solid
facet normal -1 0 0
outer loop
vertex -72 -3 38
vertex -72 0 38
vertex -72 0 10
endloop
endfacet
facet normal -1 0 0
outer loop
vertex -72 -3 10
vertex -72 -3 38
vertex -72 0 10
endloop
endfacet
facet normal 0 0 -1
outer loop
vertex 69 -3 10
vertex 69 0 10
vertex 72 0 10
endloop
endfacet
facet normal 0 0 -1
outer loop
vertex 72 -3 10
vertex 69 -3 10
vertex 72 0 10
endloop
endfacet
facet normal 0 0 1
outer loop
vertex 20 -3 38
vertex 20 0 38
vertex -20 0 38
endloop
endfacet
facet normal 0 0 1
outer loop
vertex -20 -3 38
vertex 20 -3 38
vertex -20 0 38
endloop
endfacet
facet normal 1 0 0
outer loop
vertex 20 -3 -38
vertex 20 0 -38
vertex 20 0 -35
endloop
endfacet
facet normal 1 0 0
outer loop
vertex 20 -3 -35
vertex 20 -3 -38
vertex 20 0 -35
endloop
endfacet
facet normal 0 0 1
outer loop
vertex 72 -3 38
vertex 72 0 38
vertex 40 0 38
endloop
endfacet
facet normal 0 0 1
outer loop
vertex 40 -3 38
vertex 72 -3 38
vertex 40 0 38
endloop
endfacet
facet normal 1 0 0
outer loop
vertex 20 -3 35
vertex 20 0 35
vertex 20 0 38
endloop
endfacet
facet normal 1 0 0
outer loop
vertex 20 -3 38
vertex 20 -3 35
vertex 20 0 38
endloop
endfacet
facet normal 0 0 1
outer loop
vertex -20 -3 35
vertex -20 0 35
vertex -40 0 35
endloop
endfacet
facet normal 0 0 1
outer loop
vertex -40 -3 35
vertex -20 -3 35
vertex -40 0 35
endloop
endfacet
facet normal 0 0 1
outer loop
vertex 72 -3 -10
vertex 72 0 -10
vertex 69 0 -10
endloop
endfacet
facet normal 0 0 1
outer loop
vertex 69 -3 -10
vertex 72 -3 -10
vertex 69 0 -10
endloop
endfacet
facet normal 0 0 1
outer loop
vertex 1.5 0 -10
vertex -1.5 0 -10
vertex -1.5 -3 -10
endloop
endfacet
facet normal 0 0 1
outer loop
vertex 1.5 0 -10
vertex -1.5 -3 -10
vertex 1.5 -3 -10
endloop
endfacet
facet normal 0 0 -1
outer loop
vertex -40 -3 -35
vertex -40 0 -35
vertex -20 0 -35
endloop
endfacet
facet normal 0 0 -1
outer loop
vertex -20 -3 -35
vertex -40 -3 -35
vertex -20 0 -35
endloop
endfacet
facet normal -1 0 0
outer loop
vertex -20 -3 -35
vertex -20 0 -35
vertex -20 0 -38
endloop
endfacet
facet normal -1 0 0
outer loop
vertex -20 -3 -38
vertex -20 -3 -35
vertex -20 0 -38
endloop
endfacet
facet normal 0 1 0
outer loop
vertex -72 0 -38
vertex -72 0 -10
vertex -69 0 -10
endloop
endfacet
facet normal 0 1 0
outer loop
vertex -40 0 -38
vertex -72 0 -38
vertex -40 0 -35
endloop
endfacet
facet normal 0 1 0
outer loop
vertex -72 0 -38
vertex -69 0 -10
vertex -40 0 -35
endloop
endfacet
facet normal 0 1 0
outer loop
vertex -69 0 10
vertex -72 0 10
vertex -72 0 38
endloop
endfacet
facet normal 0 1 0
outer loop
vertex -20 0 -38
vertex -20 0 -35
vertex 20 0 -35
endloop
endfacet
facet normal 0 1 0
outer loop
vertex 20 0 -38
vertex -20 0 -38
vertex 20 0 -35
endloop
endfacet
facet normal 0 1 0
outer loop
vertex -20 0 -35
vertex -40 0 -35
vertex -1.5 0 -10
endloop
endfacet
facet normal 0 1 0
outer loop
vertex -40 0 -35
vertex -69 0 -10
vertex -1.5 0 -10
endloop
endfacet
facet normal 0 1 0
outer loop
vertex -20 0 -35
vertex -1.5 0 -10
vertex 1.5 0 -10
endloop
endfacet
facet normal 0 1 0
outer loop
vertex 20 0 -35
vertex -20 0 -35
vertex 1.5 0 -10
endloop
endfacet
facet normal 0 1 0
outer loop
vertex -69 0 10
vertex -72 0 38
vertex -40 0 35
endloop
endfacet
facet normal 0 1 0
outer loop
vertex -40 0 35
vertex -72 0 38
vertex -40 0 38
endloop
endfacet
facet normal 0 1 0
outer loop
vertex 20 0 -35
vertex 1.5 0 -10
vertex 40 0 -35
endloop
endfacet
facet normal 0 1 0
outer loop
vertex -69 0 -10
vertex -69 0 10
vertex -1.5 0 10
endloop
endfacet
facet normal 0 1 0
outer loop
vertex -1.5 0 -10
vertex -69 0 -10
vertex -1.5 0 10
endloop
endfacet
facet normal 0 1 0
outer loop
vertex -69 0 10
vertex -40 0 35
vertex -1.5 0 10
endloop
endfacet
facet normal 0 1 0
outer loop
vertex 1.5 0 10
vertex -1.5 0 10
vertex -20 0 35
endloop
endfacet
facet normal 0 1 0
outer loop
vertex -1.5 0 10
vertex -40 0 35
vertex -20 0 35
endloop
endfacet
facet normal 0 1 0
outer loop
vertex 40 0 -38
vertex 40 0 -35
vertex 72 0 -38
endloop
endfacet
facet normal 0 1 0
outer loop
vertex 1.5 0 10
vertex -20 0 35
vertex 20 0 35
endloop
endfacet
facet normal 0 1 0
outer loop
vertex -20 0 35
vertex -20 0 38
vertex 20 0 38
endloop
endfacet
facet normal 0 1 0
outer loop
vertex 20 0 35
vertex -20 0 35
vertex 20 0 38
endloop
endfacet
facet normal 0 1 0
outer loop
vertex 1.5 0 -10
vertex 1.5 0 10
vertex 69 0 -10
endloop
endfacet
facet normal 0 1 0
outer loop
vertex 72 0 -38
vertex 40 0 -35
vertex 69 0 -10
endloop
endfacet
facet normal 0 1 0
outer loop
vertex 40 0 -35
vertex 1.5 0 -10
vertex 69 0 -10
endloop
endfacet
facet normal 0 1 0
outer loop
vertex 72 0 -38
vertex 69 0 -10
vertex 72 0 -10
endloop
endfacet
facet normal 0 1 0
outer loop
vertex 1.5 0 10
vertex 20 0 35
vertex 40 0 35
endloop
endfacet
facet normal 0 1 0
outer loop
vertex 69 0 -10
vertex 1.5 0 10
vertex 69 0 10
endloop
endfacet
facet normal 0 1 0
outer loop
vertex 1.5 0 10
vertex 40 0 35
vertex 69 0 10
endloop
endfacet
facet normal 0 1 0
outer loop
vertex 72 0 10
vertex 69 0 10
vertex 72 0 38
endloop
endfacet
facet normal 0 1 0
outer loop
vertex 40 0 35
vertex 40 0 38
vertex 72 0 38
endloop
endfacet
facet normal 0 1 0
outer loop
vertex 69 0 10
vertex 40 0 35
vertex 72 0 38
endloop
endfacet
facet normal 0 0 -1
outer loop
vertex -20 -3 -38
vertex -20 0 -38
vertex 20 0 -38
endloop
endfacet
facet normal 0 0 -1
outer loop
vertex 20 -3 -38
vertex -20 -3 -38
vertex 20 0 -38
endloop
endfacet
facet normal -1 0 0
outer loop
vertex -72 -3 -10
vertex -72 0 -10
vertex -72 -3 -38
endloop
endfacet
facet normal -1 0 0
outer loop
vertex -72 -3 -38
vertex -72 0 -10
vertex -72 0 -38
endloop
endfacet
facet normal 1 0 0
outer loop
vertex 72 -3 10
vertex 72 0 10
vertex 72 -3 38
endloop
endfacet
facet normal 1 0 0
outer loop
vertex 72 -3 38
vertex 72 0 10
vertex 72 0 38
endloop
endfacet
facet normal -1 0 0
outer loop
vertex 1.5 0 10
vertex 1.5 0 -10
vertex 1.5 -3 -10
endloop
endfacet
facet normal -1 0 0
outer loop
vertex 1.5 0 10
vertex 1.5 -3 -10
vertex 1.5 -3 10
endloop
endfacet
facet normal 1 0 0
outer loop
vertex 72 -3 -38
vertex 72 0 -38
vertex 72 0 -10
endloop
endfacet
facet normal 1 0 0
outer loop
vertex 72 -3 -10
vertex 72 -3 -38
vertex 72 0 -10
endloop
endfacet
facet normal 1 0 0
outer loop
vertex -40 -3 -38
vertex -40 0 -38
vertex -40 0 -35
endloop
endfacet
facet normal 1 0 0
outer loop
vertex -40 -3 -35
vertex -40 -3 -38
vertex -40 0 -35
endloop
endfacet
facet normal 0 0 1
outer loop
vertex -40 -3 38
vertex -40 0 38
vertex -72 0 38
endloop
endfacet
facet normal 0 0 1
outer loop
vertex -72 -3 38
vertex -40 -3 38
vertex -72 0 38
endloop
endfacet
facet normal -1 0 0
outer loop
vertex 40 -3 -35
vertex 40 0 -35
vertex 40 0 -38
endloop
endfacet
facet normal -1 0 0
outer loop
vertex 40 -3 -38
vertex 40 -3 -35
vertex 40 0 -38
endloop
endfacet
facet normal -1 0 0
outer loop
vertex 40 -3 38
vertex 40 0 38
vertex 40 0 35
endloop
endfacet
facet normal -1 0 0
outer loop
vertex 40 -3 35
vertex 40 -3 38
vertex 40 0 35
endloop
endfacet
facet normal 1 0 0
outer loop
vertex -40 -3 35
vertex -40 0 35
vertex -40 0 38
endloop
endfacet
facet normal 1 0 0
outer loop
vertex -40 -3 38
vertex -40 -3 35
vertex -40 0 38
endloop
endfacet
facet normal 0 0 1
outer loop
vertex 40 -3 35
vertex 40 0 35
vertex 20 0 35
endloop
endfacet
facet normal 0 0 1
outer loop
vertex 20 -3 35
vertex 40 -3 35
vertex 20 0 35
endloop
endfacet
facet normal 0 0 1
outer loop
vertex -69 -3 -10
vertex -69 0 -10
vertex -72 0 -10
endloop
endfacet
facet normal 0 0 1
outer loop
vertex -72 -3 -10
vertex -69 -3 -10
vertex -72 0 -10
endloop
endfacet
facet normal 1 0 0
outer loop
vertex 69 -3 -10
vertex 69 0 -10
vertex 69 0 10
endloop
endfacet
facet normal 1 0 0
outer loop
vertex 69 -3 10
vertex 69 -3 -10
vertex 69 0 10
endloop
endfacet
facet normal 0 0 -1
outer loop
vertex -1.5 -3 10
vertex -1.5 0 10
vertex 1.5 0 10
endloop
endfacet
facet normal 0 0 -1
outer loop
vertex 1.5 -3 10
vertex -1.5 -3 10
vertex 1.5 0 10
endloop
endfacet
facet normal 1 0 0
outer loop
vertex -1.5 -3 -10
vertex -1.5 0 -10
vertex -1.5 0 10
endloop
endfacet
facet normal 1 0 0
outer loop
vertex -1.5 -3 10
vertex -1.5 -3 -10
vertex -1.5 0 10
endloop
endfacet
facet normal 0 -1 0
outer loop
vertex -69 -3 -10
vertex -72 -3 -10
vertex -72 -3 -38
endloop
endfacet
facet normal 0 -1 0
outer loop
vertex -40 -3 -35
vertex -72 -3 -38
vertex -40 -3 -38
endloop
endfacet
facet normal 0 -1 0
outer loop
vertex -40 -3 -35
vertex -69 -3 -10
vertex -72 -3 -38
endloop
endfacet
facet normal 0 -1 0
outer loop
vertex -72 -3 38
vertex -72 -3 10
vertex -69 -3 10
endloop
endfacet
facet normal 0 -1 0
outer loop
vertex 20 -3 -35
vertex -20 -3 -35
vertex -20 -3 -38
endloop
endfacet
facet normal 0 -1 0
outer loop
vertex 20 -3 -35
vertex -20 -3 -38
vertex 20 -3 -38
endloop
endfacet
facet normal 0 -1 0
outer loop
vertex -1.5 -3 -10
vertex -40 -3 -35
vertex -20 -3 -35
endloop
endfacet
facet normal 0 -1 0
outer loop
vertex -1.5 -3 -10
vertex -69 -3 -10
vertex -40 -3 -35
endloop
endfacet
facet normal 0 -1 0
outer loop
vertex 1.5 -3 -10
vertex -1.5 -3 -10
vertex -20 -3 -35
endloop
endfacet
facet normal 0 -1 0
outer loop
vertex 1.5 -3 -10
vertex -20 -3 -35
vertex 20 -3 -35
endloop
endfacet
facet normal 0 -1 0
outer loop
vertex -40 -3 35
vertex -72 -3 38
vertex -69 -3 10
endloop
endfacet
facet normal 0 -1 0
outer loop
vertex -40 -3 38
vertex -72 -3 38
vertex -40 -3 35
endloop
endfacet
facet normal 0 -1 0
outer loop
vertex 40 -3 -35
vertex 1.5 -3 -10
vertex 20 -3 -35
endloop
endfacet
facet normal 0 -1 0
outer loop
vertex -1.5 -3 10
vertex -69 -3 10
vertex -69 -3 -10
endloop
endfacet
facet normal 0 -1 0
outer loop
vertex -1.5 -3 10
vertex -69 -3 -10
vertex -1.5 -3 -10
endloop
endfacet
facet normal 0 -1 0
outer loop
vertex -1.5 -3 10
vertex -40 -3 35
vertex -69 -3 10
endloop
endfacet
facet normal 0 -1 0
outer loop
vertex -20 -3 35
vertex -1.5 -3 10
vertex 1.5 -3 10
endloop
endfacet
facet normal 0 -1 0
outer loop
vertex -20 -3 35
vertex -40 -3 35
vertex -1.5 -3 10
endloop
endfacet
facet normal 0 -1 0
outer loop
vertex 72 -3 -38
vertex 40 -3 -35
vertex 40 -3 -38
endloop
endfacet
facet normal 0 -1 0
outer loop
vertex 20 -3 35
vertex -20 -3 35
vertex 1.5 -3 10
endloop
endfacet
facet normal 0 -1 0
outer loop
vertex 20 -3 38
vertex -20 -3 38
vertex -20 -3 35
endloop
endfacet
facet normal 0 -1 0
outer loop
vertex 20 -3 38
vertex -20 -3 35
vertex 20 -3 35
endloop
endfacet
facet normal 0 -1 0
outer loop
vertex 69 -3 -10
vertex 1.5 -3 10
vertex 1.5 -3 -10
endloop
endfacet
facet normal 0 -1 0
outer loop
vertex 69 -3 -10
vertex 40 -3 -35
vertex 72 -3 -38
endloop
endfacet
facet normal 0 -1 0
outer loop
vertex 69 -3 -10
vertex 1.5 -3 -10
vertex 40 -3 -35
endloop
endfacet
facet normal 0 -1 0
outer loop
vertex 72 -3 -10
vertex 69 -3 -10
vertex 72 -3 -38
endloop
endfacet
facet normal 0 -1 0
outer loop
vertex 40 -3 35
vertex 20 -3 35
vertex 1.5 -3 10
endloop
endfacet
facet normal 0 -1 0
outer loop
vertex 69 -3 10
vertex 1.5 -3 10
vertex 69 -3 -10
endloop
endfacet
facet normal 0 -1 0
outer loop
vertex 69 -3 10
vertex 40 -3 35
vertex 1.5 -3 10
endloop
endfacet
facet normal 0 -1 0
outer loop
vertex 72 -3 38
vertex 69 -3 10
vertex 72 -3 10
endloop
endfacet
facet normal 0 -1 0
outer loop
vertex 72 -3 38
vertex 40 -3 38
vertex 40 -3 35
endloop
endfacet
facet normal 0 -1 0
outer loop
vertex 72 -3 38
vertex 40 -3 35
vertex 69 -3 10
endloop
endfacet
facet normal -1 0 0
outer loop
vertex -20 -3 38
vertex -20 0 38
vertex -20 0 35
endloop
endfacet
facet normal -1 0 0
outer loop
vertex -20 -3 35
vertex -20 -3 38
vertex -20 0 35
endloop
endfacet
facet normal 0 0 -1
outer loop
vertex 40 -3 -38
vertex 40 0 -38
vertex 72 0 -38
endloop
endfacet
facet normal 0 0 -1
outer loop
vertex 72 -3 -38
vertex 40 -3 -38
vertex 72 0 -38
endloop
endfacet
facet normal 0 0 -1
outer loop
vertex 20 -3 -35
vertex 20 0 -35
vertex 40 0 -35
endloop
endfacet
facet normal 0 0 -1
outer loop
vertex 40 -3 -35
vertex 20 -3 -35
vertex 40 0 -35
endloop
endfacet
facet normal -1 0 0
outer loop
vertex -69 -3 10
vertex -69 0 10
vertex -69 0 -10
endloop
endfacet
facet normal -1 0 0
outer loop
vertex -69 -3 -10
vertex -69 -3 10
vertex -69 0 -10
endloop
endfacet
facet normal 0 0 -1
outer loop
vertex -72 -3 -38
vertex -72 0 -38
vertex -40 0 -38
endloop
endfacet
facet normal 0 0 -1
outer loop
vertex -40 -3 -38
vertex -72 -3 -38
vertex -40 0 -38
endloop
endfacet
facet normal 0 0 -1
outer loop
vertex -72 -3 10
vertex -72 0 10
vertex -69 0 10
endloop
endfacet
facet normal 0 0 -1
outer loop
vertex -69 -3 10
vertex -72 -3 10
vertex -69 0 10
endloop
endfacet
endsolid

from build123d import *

# Parameters (mm, degrees)
F0_W     = 3
F0_H     = 20
F1_DEPTH = 3


with BuildPart() as f1:
    # F0 (on Front) → F1 (new body)
    with BuildSketch(Plane.XZ):
        Polygon((40, -38), (72, -38), (72, -10), (69, -10), (69, 10), (72, 10), (72, 38), (40, 38), (40, 35), (20, 35), (20, 38), (-20, 38), (-20, 35), (-40, 35), (-40, 38), (-72, 38), (-72, 10), (-69, 10), (-69, -10), (-72, -10), (-72, -38), (-40, -38), (-40, -35), (-20, -35), (-20, -38), (20, -38), (20, -35), (40, -35), align=None)
        Rectangle(F0_W, F0_H, mode=Mode.SUBTRACT)
    extrude(amount=F1_DEPTH)


solid = f1.part
